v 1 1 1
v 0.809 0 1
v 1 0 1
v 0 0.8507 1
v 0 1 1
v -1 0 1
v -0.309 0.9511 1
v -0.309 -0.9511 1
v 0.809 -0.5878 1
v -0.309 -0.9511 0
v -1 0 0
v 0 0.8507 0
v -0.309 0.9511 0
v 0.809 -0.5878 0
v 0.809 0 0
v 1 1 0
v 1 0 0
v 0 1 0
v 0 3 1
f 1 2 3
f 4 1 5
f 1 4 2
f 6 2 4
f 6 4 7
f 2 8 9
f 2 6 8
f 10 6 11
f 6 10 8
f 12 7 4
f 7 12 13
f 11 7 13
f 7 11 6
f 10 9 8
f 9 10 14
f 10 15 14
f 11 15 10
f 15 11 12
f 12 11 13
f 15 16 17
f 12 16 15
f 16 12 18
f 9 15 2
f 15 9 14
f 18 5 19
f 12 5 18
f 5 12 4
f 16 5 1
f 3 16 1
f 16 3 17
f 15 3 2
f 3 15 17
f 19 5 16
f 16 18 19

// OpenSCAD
rotate_extrude(angle = -360) square();
linear_extrude(height = 1, scale = 0/0) square();
linear_extrude(height = 1, scale = [0/0, 1/0]) square();
linear_extrude(height = 1, scale = -0) square();
linear_extrude(height = 1, scale = 1/0) square();
linear_extrude(height = 1, scale = [2, 1/0]) square();
linear_extrude(height = 1, scale = [-0, 3]) square();
